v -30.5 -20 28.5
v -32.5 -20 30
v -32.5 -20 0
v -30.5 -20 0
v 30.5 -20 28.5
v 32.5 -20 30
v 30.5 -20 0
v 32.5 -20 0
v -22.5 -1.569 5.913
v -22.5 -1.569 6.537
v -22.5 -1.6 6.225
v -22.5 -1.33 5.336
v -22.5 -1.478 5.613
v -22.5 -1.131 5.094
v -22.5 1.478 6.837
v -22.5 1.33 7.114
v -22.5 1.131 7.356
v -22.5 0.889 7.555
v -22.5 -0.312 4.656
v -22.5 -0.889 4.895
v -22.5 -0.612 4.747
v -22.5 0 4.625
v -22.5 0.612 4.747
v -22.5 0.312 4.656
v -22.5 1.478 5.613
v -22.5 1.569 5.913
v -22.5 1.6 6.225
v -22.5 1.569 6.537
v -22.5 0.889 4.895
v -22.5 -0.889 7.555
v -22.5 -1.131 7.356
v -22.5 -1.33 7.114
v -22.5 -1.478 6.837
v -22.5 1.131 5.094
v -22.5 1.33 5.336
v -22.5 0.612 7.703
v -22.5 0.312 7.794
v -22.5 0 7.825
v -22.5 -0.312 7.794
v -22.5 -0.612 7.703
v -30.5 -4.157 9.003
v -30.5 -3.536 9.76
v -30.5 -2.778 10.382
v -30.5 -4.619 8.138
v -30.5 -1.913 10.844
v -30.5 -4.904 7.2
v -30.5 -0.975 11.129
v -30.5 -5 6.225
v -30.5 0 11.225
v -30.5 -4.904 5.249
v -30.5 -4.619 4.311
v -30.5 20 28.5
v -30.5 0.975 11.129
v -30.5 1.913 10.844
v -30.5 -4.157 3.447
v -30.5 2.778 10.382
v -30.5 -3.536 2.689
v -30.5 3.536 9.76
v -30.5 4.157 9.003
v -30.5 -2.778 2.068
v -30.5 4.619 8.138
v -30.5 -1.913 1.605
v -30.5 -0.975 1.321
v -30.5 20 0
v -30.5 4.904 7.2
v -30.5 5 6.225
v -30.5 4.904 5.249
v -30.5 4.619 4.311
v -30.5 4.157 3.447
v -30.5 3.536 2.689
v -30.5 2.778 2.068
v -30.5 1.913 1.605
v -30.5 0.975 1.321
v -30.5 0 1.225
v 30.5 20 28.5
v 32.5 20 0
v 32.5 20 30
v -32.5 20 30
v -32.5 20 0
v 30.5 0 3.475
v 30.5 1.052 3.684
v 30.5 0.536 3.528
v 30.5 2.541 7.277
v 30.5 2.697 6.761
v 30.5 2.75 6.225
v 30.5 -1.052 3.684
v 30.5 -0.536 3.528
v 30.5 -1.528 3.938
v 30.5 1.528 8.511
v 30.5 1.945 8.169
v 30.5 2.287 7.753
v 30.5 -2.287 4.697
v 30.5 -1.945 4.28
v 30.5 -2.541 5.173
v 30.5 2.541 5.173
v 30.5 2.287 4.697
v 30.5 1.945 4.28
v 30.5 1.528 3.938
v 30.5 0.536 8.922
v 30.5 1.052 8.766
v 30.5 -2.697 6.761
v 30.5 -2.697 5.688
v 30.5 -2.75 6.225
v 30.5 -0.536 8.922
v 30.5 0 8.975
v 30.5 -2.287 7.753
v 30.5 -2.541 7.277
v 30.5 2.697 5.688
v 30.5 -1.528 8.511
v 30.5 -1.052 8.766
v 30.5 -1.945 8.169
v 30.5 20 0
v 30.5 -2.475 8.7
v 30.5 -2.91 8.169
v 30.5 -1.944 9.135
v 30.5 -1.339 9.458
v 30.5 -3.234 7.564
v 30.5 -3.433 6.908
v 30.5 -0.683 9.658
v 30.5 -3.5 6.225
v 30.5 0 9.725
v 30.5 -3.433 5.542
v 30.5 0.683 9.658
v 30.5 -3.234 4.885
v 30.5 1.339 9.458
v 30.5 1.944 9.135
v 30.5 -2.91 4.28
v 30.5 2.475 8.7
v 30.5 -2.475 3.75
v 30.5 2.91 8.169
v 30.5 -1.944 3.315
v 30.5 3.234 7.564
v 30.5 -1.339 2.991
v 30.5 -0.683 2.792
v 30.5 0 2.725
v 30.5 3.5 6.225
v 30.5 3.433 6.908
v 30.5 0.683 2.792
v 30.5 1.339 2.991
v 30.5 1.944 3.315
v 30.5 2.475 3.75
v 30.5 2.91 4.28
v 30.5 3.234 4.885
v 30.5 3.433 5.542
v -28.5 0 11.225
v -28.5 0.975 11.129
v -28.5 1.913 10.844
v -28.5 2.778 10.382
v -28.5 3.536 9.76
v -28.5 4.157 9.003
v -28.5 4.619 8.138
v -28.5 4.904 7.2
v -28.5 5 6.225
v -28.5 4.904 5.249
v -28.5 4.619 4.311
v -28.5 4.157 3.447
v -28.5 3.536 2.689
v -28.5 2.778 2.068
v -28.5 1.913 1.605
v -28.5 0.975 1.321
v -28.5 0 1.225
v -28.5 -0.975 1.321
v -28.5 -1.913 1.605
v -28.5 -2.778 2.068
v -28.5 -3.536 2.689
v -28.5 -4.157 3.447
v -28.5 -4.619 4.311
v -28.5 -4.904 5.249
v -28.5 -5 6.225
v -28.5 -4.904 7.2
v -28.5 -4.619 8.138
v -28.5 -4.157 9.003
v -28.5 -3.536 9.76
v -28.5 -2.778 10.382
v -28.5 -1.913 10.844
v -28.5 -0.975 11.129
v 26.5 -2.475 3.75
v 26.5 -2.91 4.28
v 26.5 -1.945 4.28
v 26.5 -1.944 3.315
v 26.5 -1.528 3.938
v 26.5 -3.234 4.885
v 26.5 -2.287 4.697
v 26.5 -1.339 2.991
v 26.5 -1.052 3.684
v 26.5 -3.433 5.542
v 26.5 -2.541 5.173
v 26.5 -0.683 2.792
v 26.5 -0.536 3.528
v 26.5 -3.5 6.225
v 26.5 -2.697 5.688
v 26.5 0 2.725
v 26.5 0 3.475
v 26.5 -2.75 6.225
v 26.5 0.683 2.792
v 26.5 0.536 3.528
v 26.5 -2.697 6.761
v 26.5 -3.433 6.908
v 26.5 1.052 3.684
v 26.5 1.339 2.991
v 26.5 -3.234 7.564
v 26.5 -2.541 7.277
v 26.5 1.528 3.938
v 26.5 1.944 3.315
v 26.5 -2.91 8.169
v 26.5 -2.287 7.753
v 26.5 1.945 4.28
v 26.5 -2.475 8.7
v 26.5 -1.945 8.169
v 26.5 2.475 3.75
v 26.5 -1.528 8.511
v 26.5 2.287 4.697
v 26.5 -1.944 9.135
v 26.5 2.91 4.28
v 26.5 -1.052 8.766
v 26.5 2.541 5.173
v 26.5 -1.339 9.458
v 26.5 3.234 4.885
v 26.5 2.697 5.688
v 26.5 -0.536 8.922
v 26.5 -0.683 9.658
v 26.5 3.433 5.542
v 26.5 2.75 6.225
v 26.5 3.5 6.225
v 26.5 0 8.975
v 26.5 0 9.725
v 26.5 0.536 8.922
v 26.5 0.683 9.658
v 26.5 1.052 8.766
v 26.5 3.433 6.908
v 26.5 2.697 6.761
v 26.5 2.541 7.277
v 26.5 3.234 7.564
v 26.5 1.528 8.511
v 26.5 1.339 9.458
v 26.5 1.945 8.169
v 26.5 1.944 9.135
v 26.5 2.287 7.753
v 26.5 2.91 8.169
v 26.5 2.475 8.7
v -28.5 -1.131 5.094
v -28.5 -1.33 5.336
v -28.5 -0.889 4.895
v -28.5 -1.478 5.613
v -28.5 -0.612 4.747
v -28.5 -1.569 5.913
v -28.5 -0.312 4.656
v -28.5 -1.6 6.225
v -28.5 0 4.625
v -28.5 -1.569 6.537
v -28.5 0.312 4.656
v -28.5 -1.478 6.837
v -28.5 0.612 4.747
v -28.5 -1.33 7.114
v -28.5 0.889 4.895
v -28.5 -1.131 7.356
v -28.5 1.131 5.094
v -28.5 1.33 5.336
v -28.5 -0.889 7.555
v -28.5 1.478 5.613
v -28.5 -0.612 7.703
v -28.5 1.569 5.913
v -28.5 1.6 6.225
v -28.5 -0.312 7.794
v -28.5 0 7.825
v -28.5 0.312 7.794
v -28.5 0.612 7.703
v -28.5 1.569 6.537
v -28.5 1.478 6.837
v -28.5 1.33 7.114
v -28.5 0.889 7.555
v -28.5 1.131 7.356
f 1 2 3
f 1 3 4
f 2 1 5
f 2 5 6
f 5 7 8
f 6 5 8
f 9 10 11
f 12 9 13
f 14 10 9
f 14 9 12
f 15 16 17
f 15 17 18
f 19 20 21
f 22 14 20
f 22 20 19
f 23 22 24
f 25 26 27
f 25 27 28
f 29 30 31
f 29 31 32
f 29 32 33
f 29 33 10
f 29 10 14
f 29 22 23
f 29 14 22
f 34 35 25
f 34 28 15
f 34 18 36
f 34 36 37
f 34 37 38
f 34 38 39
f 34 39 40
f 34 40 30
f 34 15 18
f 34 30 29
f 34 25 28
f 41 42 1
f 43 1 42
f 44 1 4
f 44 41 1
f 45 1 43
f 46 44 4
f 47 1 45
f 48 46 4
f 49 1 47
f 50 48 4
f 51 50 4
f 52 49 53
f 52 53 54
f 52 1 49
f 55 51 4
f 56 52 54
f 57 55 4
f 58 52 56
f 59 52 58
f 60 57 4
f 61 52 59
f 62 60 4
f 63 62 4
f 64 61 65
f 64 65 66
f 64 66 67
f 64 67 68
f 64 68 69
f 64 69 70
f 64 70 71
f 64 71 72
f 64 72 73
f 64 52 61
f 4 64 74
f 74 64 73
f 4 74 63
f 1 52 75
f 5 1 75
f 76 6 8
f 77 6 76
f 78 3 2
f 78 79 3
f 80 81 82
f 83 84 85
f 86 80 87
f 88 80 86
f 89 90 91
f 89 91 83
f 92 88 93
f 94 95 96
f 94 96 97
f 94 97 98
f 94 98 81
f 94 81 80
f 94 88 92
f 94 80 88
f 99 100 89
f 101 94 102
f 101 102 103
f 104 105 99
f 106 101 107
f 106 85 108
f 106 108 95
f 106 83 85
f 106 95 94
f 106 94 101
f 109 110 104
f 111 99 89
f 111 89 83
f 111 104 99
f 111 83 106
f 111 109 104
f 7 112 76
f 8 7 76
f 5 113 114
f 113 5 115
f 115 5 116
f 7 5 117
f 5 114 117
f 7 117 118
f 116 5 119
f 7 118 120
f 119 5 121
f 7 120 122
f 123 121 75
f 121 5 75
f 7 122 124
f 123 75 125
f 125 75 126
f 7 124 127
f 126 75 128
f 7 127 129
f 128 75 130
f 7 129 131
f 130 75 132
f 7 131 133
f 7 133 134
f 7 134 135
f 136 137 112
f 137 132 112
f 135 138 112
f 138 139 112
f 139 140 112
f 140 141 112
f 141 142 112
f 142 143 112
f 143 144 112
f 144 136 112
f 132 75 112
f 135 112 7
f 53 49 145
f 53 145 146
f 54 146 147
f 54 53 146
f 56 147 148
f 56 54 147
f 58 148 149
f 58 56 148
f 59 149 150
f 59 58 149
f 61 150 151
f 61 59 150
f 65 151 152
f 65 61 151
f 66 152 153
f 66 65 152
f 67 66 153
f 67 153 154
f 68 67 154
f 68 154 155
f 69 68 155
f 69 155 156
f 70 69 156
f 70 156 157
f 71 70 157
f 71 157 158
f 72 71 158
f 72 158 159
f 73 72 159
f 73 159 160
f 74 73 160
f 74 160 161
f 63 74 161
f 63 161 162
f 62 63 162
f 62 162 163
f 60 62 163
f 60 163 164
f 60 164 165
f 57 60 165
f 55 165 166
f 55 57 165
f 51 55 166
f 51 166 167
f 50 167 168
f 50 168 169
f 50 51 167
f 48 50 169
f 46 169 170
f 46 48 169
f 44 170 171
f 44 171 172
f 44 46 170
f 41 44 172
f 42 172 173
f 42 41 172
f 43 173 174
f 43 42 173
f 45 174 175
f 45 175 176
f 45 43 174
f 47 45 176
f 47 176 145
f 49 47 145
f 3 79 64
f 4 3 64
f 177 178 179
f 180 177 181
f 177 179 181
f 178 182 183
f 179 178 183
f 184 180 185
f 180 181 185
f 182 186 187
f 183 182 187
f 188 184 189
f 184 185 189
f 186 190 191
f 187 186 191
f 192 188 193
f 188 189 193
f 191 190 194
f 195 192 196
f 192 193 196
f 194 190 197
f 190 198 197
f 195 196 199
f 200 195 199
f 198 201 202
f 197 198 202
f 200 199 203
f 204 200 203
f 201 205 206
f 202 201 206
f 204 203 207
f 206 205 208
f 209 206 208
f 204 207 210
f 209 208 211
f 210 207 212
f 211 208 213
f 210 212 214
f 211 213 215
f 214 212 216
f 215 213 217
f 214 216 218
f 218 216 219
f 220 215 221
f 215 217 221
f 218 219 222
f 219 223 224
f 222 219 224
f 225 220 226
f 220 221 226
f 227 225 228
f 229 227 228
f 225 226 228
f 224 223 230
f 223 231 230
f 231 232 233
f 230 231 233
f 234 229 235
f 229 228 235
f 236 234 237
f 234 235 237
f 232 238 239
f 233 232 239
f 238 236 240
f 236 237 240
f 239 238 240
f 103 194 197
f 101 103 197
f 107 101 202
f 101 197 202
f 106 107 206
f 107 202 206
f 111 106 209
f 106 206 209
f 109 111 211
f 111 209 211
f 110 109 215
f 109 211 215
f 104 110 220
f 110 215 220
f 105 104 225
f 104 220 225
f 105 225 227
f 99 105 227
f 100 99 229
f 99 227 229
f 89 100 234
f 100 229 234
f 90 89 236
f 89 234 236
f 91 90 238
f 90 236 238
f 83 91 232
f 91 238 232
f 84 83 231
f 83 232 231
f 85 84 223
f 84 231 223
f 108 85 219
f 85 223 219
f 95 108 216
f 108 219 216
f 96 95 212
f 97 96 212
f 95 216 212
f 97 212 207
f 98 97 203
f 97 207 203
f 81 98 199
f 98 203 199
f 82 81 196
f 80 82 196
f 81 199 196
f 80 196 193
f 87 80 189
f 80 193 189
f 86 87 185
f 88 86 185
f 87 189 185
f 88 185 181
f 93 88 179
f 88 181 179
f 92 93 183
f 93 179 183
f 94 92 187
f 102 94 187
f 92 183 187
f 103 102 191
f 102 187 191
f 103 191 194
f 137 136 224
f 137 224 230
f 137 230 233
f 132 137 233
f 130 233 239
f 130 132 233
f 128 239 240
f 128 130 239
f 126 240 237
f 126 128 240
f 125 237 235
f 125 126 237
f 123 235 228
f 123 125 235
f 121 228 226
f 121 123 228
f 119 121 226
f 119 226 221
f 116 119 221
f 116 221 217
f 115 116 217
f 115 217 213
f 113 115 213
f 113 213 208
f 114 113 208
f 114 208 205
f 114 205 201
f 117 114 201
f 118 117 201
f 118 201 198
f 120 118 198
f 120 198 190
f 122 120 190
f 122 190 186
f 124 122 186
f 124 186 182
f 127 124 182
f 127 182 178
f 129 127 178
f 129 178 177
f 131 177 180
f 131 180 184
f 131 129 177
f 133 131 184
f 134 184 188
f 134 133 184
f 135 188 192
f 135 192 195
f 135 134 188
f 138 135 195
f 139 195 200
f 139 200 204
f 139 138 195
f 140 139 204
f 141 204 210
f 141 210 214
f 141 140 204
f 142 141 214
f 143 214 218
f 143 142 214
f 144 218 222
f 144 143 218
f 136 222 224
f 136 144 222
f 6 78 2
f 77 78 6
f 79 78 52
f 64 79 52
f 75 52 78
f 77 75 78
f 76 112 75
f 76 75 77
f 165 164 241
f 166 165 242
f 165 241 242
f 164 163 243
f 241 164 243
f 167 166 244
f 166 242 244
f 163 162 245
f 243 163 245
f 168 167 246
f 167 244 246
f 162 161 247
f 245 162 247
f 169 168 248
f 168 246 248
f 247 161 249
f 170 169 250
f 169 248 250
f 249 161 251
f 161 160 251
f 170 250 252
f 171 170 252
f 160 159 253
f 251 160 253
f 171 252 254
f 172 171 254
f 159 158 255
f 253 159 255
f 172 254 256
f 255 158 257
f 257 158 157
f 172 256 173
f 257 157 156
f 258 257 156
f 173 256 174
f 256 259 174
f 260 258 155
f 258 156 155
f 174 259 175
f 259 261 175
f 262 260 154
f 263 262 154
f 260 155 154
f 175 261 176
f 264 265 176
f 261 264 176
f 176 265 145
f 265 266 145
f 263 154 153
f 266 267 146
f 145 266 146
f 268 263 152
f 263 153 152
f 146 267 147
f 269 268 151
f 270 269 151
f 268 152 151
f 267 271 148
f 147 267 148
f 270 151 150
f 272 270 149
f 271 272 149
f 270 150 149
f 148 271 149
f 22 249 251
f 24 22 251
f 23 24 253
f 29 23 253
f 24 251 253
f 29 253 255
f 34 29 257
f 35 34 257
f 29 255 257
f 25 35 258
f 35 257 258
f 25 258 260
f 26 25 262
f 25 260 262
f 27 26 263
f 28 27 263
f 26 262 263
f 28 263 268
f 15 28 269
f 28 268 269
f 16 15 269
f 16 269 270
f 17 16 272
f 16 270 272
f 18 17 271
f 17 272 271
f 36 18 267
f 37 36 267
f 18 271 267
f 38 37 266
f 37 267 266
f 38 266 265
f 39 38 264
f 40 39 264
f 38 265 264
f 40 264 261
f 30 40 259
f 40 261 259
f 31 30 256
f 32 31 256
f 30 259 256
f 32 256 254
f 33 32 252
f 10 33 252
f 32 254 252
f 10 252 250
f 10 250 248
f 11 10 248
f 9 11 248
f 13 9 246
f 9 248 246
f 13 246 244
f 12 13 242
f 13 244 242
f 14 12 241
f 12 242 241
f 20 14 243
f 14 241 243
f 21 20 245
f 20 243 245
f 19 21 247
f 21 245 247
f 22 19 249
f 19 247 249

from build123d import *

# Parameters (mm, degrees)
ESBO_O1_W                = 65
ESBO_O1_H                = 40
RESSALTO_EXTRUS_O1_DEPTH = 30
ESBO_O2_W                = 61
ESBO_O2_H                = 37
CORTE_EXTRUS_O1_DEPTH    = 20
ESBO_O3_W                = 61
ESBO_O3_H                = 27
CORTE_EXTRUS_O2_DEPTH    = 49
ESBO_O5_W                = 61
ESBO_O5_H                = 1.5
CORTE_EXTRUS_O3_DEPTH    = 49
ESBO_O7_R                = 5
RESSALTO_EXTRUS_O2_DEPTH = 4
ESBO_O8_R                = 1.6
RESSALTO_EXTRUS_O3_DEPTH = 6
ESBO_O10_R               = 3.5
RESSALTO_EXTRUS_O4_DEPTH = 6
ESBO_O12_R               = 2.75
CORTE_EXTRUS_O4_DEPTH    = 4


with BuildPart() as part:
    # Esboço1 → Ressalto-extrusão1 (new body)
    with BuildSketch(Plane.XY):
        Rectangle(ESBO_O1_W, ESBO_O1_H)
    extrude(amount=RESSALTO_EXTRUS_O1_DEPTH)

    # Esboço2 → Corte-extrusão1 (cut)
    with BuildSketch(Plane(origin=(0, 0, 0), x_dir=(-1, 0, 0), z_dir=(0, 0, -1))):
        Rectangle(ESBO_O2_W, ESBO_O2_H)
    extrude(amount=-CORTE_EXTRUS_O1_DEPTH, mode=Mode.SUBTRACT)

    # Esboço3 → Corte-extrusão2 (cut)
    with BuildSketch(Plane(origin=(0, 20, 0), x_dir=(1, 0, 0), z_dir=(0, 1, 0))):
        with Locations((0, -15)):
            Rectangle(ESBO_O3_W, ESBO_O3_H)
    extrude(amount=-CORTE_EXTRUS_O2_DEPTH, mode=Mode.SUBTRACT)

    # Esboço5 → Corte-extrusão3 (cut)
    with BuildSketch(Plane(origin=(0, 20, 0), x_dir=(1, 0, 0), z_dir=(0, 1, 0))):
        with Locations((0, -0.75)):
            Rectangle(ESBO_O5_W, ESBO_O5_H)
    extrude(amount=-CORTE_EXTRUS_O3_DEPTH, mode=Mode.SUBTRACT)

    # Esboço7 → Ressalto-extrusão2 (add)
    with BuildSketch(Plane.ZY.offset(32.5)):
        with Locations((6.224890869, 0)):
            Circle(ESBO_O7_R)
    extrude(amount=-RESSALTO_EXTRUS_O2_DEPTH)

    # Esboço8 → Ressalto-extrusão3 (add)
    with BuildSketch(Plane(origin=(-28.5, 0, 0), x_dir=(0, 0, -1), z_dir=(1, 0, 0))):
        with Locations((-6.224890869, 0)):
            Circle(ESBO_O8_R)
    extrude(amount=RESSALTO_EXTRUS_O3_DEPTH)

    # Esboço10 → Ressalto-extrusão4 (add)
    with BuildSketch(Plane(origin=(32.5, 0, 0), x_dir=(0, 0, -1), z_dir=(1, 0, 0))):
        with Locations(Location((-6.224890869, 0, 0), (0, 0, 90))):
            Circle(ESBO_O10_R)
    extrude(amount=-RESSALTO_EXTRUS_O4_DEPTH)

    # Esboço12 → Corte-extrusão4 (cut)
    with BuildSketch(Plane.ZY.offset(-26.5)):
        with Locations(Location((6.224890869, 0, 0), (0, 0, 270))):
            Circle(ESBO_O12_R)
    extrude(amount=-CORTE_EXTRUS_O4_DEPTH, mode=Mode.SUBTRACT)


solid = part.part
